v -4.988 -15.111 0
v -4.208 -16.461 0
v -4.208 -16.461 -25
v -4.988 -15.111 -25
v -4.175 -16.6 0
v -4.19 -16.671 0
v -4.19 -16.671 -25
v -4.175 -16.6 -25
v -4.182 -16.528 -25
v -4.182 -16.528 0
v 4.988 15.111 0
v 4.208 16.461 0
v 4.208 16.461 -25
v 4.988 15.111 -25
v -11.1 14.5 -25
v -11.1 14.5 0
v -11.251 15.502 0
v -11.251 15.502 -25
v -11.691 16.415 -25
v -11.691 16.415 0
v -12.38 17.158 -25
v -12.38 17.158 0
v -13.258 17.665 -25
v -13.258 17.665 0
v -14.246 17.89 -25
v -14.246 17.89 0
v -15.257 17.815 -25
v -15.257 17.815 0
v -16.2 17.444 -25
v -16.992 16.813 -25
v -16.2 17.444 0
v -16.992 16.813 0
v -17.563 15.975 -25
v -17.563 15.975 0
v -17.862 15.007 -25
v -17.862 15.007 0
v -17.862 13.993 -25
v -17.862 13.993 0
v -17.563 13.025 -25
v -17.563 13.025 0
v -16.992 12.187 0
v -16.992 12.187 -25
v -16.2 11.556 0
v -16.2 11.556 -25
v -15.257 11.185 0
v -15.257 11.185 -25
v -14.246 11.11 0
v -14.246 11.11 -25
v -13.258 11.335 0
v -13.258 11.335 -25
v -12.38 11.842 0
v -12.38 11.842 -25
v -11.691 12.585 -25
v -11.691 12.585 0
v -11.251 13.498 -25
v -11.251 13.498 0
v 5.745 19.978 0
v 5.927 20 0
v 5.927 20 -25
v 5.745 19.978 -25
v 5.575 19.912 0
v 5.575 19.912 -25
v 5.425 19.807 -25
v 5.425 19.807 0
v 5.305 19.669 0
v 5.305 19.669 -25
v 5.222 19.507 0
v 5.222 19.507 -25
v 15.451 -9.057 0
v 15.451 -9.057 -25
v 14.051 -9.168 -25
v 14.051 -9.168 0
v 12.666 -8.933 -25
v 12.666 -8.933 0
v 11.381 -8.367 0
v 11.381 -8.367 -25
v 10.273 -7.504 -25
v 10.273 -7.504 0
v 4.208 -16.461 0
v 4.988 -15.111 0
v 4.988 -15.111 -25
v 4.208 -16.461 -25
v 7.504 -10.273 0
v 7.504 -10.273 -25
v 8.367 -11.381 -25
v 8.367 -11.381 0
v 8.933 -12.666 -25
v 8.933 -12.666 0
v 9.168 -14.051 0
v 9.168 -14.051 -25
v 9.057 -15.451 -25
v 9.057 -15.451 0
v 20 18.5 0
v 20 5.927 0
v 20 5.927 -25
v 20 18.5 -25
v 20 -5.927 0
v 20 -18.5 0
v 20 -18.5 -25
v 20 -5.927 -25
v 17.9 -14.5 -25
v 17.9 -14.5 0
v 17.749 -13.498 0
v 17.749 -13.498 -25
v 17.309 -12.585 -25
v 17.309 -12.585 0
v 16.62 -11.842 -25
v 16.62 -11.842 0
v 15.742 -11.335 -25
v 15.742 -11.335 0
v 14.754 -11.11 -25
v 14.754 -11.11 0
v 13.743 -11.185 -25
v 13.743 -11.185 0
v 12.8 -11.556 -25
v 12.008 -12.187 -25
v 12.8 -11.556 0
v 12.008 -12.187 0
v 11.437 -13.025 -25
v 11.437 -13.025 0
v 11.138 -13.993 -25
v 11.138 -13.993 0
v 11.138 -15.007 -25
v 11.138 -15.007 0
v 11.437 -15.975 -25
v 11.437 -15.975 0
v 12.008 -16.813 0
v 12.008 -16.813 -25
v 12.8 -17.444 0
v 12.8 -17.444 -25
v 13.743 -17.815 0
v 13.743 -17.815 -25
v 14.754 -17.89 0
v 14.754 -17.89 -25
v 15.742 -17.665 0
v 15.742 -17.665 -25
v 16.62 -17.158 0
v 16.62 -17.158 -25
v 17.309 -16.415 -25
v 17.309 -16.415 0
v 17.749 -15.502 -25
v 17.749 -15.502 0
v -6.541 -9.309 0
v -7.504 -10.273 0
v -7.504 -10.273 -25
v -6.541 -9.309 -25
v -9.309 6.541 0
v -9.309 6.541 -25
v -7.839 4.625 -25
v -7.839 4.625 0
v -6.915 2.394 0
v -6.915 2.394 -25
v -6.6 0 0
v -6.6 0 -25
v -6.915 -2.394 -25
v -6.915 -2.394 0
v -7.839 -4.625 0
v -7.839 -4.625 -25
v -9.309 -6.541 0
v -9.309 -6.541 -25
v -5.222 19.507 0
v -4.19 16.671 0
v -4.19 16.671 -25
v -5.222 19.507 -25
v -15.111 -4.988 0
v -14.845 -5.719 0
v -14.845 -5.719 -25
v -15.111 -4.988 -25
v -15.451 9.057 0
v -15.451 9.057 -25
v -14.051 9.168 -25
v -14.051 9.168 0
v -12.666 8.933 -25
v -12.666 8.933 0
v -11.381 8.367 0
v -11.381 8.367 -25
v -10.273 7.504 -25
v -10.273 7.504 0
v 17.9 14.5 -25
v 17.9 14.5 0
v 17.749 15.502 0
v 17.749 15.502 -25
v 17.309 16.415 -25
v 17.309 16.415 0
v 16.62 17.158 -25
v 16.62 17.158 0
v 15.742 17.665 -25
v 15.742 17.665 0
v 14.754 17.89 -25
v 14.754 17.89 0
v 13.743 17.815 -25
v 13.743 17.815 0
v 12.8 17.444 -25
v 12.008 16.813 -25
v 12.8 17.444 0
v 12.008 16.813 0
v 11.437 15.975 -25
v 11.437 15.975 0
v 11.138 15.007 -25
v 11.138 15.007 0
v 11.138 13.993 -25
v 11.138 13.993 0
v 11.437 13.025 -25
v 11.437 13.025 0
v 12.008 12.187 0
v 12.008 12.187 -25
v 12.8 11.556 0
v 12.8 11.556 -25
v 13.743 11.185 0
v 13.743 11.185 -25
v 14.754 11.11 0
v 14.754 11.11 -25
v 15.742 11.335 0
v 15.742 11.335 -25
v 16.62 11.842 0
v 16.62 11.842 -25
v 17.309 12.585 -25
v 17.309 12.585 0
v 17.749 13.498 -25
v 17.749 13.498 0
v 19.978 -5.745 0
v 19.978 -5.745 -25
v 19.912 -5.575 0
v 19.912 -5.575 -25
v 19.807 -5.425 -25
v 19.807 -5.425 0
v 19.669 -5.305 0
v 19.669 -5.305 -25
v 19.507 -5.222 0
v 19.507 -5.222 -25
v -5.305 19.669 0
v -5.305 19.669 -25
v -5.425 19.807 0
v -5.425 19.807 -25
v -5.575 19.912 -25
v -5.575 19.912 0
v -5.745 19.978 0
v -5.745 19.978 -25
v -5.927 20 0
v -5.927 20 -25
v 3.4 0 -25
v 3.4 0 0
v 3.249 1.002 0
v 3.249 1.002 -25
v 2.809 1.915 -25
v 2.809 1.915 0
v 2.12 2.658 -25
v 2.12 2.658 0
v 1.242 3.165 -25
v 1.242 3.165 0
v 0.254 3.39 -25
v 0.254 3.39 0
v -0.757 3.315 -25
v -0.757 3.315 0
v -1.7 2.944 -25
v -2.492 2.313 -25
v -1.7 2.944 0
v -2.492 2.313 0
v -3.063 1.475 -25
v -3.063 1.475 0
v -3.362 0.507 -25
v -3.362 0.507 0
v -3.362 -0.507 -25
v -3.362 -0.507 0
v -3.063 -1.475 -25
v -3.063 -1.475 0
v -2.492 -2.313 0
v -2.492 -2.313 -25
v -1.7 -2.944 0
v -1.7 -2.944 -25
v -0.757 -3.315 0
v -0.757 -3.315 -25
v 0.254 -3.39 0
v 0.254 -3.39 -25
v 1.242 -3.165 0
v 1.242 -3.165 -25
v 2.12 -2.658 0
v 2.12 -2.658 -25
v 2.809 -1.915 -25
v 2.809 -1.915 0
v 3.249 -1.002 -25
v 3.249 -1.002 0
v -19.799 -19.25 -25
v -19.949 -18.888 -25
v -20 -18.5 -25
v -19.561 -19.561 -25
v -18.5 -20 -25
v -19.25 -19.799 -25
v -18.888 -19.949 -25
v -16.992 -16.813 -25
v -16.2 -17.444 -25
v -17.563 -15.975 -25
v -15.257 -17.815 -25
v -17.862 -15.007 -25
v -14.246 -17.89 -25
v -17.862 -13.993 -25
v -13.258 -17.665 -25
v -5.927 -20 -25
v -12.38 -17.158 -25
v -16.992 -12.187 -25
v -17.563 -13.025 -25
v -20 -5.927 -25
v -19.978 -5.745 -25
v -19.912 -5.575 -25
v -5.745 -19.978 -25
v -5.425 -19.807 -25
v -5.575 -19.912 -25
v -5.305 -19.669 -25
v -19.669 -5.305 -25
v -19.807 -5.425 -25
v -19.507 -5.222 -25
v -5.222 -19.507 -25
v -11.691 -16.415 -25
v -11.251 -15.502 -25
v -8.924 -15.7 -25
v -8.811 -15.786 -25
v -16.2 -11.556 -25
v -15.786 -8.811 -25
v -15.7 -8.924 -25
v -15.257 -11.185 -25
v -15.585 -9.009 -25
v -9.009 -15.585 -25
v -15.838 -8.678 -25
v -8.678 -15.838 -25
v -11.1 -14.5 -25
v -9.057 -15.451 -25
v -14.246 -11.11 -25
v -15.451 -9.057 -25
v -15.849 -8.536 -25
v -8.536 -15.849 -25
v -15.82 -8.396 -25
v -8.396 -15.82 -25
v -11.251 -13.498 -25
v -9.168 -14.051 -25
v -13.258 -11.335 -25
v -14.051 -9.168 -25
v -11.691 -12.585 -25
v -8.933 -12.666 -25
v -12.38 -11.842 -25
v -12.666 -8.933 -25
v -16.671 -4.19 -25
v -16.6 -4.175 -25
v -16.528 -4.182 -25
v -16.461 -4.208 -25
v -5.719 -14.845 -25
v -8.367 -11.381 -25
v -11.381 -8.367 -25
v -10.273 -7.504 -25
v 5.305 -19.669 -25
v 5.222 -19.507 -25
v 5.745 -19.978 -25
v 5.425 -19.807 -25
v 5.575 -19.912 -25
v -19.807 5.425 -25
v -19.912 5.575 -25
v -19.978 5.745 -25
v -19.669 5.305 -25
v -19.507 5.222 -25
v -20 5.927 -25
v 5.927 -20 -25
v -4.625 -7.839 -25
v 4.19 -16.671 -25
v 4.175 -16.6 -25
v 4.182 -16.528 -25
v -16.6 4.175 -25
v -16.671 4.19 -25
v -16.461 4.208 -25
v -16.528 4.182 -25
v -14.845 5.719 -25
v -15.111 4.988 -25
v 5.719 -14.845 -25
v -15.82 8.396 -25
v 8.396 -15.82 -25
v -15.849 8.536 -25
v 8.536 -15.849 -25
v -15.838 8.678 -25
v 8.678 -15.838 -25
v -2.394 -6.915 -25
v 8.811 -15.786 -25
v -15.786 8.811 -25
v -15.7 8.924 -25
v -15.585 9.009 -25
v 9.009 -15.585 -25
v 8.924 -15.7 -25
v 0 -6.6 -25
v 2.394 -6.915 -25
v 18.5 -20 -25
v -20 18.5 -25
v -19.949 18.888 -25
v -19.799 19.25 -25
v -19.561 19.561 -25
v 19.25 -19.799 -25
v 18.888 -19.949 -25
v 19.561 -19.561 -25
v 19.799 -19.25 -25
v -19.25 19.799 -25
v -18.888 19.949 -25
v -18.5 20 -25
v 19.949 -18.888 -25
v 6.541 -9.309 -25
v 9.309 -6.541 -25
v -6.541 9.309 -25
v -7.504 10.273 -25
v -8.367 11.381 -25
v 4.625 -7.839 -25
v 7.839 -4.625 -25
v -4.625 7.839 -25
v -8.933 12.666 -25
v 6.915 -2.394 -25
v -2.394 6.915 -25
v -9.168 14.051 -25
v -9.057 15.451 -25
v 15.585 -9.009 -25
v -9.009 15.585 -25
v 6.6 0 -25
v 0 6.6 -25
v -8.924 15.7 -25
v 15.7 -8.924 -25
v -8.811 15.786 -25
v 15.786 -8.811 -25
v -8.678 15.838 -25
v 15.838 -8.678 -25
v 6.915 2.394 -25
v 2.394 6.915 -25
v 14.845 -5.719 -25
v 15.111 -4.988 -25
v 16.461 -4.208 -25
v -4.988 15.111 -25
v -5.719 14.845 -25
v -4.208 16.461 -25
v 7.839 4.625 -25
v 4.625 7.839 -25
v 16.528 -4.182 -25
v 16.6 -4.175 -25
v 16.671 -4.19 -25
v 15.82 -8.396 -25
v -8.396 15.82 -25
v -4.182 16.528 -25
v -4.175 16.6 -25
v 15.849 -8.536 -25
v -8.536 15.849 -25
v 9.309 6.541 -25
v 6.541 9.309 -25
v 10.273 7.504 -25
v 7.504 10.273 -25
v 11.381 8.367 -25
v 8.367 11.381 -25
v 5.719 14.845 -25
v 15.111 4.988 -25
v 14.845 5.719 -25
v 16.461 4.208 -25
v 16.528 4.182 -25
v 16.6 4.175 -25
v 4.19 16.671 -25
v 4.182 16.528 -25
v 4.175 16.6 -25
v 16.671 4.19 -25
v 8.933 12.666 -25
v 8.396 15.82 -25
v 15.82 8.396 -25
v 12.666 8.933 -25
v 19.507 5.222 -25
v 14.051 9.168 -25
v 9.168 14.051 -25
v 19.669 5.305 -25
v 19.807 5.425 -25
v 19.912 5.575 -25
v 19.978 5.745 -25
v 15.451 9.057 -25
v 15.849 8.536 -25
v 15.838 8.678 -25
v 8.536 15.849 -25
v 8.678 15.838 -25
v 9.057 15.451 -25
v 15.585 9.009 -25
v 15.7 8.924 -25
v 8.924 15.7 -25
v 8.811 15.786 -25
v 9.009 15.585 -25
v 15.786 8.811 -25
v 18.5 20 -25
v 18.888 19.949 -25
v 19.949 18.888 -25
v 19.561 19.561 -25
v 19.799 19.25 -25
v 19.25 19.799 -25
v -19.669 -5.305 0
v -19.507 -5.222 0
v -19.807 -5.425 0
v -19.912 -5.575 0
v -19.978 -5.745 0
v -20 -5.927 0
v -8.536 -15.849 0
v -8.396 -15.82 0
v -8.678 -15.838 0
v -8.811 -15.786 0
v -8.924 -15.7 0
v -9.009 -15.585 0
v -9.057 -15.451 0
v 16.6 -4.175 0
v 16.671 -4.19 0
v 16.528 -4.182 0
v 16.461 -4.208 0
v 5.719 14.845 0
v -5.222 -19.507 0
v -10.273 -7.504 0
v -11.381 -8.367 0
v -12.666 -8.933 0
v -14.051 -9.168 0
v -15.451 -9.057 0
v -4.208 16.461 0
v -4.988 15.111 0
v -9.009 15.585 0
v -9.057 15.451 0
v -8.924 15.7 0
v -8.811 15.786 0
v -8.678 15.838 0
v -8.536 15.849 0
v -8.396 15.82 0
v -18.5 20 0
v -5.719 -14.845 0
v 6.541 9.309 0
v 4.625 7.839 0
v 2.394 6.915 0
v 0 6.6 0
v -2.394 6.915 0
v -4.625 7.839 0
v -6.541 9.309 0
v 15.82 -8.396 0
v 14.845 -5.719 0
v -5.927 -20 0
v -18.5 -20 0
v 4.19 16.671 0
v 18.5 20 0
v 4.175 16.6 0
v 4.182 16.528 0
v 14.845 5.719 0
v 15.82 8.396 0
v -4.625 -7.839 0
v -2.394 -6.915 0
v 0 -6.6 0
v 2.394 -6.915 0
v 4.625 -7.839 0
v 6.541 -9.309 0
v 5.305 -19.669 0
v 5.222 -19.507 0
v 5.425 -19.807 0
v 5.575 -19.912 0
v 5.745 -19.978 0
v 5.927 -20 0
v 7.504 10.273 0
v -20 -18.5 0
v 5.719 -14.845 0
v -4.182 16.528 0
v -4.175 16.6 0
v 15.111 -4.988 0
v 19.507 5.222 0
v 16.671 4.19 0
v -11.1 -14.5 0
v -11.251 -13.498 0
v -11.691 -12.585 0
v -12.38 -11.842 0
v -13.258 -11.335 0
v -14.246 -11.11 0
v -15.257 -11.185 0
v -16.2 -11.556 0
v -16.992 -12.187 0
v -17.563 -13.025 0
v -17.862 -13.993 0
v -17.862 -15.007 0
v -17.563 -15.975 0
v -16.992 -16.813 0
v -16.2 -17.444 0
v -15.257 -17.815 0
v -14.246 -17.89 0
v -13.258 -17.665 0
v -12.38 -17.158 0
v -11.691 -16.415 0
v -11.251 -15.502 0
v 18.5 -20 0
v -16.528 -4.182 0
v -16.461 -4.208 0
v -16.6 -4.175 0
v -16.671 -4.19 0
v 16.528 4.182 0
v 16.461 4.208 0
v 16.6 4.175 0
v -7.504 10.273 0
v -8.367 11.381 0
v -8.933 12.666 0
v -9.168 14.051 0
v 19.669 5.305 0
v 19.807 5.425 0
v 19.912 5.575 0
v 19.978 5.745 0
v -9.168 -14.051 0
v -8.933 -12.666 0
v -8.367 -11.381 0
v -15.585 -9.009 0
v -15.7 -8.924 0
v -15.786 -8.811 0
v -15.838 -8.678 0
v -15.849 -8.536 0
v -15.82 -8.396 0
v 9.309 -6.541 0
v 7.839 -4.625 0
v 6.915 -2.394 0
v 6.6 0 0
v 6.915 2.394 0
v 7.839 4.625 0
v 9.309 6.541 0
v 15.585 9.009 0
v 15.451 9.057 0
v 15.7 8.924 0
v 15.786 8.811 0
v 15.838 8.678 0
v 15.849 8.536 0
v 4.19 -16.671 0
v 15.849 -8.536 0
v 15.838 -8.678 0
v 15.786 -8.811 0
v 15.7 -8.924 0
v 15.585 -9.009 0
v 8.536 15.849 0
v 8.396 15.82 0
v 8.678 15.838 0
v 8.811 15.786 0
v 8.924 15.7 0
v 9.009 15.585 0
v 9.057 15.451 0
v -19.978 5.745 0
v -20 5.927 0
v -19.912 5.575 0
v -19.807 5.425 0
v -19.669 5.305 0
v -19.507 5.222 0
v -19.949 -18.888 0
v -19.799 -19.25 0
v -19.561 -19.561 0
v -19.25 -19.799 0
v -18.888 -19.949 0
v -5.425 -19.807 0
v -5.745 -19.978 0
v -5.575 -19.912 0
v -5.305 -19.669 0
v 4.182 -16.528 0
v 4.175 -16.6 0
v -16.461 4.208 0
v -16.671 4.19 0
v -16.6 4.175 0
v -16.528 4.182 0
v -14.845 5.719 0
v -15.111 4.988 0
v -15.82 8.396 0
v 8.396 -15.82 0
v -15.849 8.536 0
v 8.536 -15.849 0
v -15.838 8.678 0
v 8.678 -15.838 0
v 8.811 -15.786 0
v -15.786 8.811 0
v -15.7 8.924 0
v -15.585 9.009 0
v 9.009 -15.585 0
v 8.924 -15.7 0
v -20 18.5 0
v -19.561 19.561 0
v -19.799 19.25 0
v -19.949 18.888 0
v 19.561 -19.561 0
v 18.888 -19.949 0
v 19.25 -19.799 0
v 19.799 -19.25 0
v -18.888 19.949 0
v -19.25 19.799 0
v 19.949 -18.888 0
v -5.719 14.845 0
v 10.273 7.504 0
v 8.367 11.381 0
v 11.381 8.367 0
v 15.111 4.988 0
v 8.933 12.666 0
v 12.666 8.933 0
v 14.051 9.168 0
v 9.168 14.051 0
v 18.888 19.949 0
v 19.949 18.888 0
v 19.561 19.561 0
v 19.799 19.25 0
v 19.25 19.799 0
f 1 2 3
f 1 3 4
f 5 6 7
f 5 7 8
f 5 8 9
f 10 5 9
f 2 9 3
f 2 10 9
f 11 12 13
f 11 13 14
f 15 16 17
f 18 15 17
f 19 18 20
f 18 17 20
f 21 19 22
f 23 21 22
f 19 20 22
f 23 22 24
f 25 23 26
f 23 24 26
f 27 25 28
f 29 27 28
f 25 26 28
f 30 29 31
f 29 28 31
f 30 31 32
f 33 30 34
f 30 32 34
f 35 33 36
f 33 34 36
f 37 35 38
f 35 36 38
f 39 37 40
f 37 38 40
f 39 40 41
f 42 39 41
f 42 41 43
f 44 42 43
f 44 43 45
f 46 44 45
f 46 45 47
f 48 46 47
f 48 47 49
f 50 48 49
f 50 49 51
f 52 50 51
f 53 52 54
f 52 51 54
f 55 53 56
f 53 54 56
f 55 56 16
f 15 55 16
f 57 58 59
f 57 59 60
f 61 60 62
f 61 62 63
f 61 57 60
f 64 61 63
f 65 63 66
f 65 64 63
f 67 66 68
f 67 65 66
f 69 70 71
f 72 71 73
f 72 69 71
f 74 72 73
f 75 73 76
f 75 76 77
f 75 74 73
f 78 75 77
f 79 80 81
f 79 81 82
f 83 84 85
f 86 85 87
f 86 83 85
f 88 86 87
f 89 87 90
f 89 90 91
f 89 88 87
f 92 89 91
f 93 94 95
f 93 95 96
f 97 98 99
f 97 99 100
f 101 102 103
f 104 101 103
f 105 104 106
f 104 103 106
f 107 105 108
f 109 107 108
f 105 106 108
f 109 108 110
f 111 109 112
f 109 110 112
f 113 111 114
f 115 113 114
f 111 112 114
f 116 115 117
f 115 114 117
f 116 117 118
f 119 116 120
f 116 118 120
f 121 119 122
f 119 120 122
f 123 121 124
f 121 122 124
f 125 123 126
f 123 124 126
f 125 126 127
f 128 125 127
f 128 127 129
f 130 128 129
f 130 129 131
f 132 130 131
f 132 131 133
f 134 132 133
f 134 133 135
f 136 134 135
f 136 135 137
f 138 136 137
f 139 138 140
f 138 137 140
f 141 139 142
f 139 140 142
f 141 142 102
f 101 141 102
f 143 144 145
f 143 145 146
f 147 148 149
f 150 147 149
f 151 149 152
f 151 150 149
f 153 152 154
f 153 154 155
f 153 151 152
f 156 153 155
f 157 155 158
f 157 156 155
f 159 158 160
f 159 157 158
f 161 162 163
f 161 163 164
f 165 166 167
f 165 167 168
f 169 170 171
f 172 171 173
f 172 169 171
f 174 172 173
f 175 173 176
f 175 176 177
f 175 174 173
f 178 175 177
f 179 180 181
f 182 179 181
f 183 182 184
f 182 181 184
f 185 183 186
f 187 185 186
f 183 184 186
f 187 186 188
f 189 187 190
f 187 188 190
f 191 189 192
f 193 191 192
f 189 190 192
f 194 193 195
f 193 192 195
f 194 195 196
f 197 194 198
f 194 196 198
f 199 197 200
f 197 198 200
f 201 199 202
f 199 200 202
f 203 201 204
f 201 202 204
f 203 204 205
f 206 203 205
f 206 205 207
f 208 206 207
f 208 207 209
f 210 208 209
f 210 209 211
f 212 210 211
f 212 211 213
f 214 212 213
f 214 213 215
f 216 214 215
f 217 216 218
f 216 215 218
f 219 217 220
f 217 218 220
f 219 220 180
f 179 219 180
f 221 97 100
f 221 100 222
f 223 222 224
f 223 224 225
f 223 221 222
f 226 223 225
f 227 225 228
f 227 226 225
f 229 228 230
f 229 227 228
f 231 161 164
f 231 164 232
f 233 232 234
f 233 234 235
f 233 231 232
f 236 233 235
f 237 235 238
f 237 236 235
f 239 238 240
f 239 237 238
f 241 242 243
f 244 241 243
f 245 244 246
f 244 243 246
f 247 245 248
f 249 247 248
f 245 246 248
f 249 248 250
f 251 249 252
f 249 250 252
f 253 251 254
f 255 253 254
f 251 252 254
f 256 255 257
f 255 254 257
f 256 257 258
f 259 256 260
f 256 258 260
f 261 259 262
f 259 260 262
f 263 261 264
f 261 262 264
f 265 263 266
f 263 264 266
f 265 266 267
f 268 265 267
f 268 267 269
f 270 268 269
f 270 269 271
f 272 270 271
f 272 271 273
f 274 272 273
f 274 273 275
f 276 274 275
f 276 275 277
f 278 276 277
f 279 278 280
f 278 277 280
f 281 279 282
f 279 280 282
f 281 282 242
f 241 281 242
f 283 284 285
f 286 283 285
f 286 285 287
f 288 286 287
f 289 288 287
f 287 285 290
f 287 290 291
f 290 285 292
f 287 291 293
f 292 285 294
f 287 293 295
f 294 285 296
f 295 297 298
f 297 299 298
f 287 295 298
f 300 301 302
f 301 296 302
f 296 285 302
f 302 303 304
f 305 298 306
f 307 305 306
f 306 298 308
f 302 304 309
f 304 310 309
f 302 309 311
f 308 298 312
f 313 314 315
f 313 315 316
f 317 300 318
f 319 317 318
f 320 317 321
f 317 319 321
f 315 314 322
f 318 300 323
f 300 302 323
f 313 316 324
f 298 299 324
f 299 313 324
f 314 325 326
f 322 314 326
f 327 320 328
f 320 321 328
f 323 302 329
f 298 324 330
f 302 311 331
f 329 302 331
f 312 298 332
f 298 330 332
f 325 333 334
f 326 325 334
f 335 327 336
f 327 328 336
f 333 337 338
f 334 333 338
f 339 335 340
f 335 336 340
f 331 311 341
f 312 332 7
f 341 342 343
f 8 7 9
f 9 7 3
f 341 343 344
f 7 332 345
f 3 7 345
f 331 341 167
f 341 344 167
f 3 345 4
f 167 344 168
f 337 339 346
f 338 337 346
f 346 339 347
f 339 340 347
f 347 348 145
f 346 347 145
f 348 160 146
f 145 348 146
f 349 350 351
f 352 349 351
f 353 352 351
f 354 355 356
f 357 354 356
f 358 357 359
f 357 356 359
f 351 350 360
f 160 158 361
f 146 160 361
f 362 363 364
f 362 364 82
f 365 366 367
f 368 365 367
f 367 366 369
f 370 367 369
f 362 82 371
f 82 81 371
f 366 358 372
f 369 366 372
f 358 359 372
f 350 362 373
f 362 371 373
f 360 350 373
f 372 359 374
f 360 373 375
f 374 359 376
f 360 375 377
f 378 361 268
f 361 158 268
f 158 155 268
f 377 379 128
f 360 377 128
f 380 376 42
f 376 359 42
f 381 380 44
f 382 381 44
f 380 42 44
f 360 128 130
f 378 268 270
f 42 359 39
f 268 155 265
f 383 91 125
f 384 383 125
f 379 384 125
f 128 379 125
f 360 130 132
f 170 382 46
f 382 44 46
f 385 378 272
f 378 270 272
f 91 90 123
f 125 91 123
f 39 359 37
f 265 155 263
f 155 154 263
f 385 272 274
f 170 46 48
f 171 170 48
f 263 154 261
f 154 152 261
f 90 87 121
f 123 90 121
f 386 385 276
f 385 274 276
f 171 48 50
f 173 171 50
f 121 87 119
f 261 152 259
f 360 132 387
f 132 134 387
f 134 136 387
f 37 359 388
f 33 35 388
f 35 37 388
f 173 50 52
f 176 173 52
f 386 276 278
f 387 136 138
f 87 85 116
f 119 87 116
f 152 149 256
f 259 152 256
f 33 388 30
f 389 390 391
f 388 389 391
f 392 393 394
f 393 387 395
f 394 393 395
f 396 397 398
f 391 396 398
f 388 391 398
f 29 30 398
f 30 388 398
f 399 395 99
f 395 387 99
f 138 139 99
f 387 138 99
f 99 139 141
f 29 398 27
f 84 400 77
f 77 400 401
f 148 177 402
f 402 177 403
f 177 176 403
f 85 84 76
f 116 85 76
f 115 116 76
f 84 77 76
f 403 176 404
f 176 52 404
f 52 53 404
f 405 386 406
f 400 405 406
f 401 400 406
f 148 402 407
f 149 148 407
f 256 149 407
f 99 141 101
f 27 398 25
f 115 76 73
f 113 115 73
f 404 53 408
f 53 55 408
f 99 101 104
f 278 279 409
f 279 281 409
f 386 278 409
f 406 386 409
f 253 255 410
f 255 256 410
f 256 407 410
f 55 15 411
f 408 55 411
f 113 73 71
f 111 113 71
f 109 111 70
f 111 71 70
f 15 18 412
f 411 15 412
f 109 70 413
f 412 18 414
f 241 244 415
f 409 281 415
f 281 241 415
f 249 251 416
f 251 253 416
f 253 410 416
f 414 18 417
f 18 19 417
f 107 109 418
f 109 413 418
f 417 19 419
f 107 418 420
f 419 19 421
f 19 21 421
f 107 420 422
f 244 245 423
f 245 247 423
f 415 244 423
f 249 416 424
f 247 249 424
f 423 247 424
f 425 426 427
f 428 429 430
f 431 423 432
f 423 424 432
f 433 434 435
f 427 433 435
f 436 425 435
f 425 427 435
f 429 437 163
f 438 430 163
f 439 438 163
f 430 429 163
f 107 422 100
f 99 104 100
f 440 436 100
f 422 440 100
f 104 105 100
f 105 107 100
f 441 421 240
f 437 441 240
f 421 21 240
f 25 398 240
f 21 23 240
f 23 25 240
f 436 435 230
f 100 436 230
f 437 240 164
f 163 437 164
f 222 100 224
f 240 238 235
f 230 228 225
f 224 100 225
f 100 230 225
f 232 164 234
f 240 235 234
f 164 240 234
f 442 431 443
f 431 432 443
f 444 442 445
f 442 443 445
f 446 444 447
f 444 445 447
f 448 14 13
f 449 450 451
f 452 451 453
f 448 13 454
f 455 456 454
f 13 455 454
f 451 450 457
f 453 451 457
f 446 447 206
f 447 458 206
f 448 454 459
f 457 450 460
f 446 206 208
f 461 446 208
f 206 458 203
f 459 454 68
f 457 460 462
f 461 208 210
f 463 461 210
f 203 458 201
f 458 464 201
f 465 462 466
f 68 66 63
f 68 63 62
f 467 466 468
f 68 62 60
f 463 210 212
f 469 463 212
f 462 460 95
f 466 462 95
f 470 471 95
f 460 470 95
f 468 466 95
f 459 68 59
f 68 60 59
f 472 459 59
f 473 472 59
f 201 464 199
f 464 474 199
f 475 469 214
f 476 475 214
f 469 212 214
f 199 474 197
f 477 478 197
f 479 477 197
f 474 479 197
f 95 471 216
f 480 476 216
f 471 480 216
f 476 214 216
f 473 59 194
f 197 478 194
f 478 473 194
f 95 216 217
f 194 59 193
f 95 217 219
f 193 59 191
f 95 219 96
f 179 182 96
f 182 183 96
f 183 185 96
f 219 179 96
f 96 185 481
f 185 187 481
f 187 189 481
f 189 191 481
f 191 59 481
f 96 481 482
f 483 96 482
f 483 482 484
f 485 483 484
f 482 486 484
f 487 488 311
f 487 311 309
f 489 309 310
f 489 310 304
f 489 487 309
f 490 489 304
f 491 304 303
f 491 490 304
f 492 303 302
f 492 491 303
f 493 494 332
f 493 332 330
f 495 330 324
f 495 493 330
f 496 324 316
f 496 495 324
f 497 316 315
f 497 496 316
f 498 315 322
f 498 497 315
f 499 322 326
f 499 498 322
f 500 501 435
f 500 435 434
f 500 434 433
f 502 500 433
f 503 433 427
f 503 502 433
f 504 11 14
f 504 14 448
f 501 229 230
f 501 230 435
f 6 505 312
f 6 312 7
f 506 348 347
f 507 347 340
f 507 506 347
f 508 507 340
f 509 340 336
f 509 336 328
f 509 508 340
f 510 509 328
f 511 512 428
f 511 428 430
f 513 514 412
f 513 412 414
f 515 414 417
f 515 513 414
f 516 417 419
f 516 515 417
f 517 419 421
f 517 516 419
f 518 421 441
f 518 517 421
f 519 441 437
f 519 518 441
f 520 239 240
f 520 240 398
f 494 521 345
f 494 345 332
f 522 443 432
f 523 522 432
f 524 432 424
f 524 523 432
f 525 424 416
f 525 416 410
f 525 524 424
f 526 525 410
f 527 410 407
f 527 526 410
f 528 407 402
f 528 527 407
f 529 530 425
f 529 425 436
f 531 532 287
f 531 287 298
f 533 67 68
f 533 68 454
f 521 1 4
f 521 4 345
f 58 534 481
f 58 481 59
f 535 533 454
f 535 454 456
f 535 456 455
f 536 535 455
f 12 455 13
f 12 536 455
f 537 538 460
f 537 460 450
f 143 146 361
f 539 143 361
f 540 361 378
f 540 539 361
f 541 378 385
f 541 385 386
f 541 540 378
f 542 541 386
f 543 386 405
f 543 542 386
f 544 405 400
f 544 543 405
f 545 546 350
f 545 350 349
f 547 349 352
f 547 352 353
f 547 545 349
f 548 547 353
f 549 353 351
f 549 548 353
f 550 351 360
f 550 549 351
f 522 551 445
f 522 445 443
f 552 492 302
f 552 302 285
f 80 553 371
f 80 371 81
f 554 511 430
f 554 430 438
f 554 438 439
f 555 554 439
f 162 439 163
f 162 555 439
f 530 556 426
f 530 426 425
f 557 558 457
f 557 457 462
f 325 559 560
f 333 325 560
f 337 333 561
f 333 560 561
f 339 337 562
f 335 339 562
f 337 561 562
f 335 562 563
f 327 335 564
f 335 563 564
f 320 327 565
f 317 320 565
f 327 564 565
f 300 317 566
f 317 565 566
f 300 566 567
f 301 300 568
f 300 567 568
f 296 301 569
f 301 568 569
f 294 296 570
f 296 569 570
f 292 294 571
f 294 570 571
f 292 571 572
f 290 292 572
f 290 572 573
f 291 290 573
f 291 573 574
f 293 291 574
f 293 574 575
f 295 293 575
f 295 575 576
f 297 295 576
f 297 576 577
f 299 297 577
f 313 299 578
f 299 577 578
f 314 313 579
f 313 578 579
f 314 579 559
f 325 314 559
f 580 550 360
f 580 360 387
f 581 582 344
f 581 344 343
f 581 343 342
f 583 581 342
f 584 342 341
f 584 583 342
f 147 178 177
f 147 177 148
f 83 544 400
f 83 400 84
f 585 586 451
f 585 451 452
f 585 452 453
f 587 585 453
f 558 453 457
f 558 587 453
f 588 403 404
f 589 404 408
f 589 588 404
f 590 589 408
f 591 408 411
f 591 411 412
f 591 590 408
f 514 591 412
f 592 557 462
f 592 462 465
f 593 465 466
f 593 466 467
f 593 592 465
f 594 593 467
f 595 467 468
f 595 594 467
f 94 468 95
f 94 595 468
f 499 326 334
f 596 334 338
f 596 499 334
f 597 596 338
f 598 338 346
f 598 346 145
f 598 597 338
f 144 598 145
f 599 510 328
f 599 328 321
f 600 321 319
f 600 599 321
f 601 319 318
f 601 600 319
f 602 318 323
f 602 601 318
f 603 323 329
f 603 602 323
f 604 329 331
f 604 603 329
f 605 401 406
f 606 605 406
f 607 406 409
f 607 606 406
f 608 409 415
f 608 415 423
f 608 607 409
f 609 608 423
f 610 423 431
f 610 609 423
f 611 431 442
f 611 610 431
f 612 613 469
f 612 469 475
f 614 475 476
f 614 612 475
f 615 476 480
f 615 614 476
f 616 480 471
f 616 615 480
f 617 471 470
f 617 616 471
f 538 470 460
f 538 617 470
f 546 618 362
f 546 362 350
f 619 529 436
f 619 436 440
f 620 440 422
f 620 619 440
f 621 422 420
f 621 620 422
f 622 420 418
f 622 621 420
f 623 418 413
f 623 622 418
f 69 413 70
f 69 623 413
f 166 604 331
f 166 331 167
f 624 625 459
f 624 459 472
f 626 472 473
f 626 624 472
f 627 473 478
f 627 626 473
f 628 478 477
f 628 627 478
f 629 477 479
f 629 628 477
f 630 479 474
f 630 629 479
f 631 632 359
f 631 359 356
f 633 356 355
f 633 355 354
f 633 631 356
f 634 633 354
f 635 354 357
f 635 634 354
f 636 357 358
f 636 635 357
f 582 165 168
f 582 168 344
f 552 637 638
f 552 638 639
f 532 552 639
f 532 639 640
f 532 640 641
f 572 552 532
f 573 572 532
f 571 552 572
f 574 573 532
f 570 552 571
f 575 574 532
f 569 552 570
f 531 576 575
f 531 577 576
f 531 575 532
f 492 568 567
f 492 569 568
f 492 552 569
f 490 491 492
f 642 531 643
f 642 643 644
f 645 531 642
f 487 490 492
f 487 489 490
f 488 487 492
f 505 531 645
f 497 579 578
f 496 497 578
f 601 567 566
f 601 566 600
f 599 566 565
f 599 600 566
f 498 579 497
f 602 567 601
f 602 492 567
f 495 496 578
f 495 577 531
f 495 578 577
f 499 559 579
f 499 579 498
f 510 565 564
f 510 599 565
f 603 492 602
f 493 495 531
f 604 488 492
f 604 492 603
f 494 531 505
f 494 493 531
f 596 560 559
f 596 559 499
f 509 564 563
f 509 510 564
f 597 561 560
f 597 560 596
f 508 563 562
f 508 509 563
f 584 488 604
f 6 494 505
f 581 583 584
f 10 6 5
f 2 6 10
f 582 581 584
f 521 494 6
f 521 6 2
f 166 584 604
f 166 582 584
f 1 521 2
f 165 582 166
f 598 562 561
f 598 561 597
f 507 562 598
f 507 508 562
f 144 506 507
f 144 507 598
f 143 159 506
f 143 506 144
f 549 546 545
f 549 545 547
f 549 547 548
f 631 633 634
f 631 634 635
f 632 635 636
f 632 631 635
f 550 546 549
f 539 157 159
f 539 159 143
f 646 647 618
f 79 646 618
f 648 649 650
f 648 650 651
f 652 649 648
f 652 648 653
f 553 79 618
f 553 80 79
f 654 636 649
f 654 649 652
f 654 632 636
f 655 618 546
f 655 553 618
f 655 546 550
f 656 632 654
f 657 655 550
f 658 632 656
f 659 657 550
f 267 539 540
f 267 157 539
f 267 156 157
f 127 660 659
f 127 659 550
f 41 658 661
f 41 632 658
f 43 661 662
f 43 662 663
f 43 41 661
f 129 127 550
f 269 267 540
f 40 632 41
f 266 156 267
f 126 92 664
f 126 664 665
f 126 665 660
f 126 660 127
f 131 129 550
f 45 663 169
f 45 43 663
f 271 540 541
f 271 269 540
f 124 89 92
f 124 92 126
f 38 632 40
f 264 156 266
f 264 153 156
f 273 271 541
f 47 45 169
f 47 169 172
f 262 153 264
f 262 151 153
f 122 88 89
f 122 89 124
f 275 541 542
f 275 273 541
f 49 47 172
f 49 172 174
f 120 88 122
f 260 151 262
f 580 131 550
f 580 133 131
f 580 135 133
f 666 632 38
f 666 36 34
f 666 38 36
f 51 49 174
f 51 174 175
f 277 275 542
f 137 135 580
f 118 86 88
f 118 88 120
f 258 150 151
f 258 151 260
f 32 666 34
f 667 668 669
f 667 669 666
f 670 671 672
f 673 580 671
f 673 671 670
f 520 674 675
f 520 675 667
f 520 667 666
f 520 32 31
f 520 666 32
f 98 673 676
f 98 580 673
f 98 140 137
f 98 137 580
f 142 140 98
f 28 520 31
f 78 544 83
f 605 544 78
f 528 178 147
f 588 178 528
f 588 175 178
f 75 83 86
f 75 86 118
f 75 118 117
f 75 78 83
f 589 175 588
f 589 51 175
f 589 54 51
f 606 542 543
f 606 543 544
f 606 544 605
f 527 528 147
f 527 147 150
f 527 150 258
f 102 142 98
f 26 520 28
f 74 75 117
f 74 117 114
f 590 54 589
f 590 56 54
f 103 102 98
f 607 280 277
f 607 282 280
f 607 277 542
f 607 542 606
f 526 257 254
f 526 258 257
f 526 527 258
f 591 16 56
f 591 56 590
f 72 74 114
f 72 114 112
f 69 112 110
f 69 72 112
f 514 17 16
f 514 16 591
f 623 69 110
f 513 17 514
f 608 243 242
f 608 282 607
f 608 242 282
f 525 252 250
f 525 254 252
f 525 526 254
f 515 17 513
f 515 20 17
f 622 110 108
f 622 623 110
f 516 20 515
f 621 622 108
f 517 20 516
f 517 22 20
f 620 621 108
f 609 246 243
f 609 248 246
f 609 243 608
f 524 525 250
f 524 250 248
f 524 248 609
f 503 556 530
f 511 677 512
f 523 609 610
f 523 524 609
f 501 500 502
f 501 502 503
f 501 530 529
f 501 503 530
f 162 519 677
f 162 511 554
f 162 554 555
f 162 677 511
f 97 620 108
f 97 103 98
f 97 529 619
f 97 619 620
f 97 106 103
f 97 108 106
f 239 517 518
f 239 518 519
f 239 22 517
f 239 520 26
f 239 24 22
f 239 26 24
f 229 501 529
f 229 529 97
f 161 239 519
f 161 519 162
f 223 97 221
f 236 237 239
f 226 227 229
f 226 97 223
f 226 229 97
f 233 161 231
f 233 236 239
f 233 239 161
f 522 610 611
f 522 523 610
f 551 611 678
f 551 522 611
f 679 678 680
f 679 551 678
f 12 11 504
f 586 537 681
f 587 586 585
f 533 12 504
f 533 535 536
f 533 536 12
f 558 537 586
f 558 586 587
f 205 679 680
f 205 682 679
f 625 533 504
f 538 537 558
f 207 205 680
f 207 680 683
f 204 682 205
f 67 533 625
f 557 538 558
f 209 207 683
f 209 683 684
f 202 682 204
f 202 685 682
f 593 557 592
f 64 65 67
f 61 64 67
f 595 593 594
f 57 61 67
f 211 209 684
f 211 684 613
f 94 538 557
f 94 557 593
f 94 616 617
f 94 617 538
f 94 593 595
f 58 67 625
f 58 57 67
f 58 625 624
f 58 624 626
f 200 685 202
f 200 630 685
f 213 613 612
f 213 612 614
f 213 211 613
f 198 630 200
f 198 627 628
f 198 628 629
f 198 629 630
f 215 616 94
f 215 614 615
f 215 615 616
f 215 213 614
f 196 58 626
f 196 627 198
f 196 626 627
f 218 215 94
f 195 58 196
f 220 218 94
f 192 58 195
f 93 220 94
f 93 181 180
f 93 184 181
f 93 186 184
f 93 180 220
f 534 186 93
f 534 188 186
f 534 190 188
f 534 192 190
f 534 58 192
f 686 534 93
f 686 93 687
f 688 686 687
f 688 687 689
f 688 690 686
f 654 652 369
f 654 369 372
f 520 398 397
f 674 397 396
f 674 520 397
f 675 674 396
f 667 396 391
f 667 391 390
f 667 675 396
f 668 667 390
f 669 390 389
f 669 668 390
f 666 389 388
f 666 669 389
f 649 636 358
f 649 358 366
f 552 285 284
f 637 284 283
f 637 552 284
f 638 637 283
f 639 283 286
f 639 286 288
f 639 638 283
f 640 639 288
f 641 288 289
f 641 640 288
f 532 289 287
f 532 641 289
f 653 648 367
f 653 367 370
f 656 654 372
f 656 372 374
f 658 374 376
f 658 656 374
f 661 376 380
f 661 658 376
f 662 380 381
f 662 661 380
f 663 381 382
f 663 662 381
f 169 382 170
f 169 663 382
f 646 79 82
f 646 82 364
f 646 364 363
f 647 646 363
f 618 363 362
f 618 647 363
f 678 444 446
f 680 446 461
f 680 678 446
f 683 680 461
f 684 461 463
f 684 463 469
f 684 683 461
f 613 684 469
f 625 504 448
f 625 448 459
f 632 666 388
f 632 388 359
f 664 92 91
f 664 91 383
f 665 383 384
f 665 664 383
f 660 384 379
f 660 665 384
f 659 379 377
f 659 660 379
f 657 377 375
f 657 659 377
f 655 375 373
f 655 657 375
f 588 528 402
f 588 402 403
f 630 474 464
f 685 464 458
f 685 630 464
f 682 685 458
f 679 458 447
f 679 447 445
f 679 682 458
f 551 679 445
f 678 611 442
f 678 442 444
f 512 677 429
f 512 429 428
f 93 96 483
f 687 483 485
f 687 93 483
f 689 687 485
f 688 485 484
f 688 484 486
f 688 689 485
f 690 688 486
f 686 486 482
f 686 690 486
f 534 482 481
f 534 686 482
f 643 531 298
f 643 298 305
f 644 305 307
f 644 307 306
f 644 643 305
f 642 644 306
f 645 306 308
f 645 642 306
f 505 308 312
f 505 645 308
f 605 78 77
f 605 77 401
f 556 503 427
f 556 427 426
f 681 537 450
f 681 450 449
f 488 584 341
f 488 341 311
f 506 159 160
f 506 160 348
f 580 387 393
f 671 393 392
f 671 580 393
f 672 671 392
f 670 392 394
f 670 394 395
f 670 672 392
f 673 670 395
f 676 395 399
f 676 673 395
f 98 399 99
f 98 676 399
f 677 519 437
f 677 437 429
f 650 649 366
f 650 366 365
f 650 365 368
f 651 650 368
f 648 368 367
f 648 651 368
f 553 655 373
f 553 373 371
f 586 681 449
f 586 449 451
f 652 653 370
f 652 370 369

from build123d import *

# Parameters (mm, degrees)
SK_MAIN_EXTRUSION_R  = 3.4
MAIN_EXTRUSION_DEPTH = 25


with BuildPart() as part:
    # Sk Main Extrusion → Main Extrusion (new body)
    with BuildSketch(Plane.XY):
        with BuildLine():
            Line((4.190076845, -16.671180212), (5.222054351, -19.506515107))
            ThreePointArc((5.222054351, -19.506515107), (5.496641489, -19.864364033), (5.926823816, -20))
            Line((5.926823816, -20), (18.5, -20))
            ThreePointArc((18.5, -20), (19.560660172, -19.560660172), (20, -18.5))
            Line((20, -18.5), (20, -5.926823816))
            ThreePointArc((20, -5.926823816), (19.864364033, -5.496641489), (19.506515107, -5.222054351))
            Line((19.506515107, -5.222054351), (16.671180212, -4.190076845))
            ThreePointArc((16.671180212, -4.190076845), (16.563886241, -4.175951325), (16.460675177, -4.208493649))
            Line((16.460675177, -4.208493649), (15.111296024, -4.987558066))
            Line((15.111296024, -4.987558066), (14.845251581, -5.718509166))
            Line((14.845251581, -5.718509166), (15.81984631, -8.396186179))
            ThreePointArc((15.81984631, -8.396186179), (15.786489799, -8.811074612), (15.450654467, -9.056960151))
            ThreePointArc((15.450654467, -9.056960151), (12.665882372, -8.933433013), (10.272684887, -7.504160339))
            Line((10.272684887, -7.504160339), (9.309262274, -6.540737726))
            ThreePointArc((9.309262274, -6.540737726), (6.6, 0), (9.309262274, 6.540737726))
            Line((9.309262274, 6.540737726), (10.272684887, 7.504160339))
            ThreePointArc((10.272684887, 7.504160339), (12.665882372, 8.933433013), (15.450654467, 9.056960151))
            ThreePointArc((15.450654467, 9.056960151), (15.786489799, 8.811074612), (15.81984631, 8.396186179))
            Line((15.81984631, 8.396186179), (14.845251581, 5.718509166))
            Line((14.845251581, 5.718509166), (15.111296024, 4.987558066))
            Line((15.111296024, 4.987558066), (16.460675177, 4.208493649))
            ThreePointArc((16.460675177, 4.208493649), (16.563886241, 4.175951325), (16.671180212, 4.190076845))
            Line((16.671180212, 4.190076845), (19.506515107, 5.222054351))
            ThreePointArc((19.506515107, 5.222054351), (19.864364033, 5.496641489), (20, 5.926823816))
            Line((20, 5.926823816), (20, 18.5))
            ThreePointArc((20, 18.5), (19.560660172, 19.560660172), (18.5, 20))
            Line((18.5, 20), (5.926823816, 20))
            ThreePointArc((5.926823816, 20), (5.496641489, 19.864364033), (5.222054351, 19.506515107))
            Line((5.222054351, 19.506515107), (4.190076845, 16.671180212))
            ThreePointArc((4.190076845, 16.671180212), (4.175951325, 16.563886241), (4.208493649, 16.460675177))
            Line((4.208493649, 16.460675177), (4.987558066, 15.111296024))
            Line((4.987558066, 15.111296024), (5.718509166, 14.845251581))
            Line((5.718509166, 14.845251581), (8.396186179, 15.81984631))
            ThreePointArc((8.396186179, 15.81984631), (8.811074612, 15.786489799), (9.056960151, 15.450654467))
            ThreePointArc((9.056960151, 15.450654467), (8.933433013, 12.665882372), (7.504160339, 10.272684887))
            Line((7.504160339, 10.272684887), (6.540737726, 9.309262274))
            ThreePointArc((6.540737726, 9.309262274), (0, 6.6), (-6.540737726, 9.309262274))
            Line((-6.540737726, 9.309262274), (-7.504160339, 10.272684887))
            ThreePointArc((-7.504160339, 10.272684887), (-8.933433013, 12.665882372), (-9.056960151, 15.450654467))
            ThreePointArc((-9.056960151, 15.450654467), (-8.811074612, 15.786489799), (-8.396186179, 15.81984631))
            Line((-8.396186179, 15.81984631), (-5.718509166, 14.845251581))
            Line((-5.718509166, 14.845251581), (-4.987558066, 15.111296024))
            Line((-4.987558066, 15.111296024), (-4.208493649, 16.460675177))
            ThreePointArc((-4.208493649, 16.460675177), (-4.175951325, 16.563886241), (-4.190076845, 16.671180212))
            Line((-4.190076845, 16.671180212), (-5.222054351, 19.506515107))
            ThreePointArc((-5.222054351, 19.506515107), (-5.496641489, 19.864364033), (-5.926823816, 20))
            Line((-5.926823816, 20), (-18.5, 20))
            ThreePointArc((-18.5, 20), (-19.560660172, 19.560660172), (-20, 18.5))
            Line((-20, 18.5), (-20, 5.926823816))
            ThreePointArc((-20, 5.926823816), (-19.864364033, 5.496641489), (-19.506515107, 5.222054351))
            Line((-19.506515107, 5.222054351), (-16.671180212, 4.190076845))
            ThreePointArc((-16.671180212, 4.190076845), (-16.563886241, 4.175951325), (-16.460675177, 4.208493649))
            Line((-16.460675177, 4.208493649), (-15.111296024, 4.987558066))
            Line((-15.111296024, 4.987558066), (-14.845251581, 5.718509166))
            Line((-14.845251581, 5.718509166), (-15.81984631, 8.396186179))
            ThreePointArc((-15.81984631, 8.396186179), (-15.786489799, 8.811074612), (-15.450654467, 9.056960151))
            ThreePointArc((-15.450654467, 9.056960151), (-12.665882372, 8.933433013), (-10.272684887, 7.504160339))
            Line((-10.272684887, 7.504160339), (-9.309262274, 6.540737726))
            ThreePointArc((-9.309262274, 6.540737726), (-6.6, 0), (-9.309262274, -6.540737726))
            Line((-9.309262274, -6.540737726), (-10.272684887, -7.504160339))
            ThreePointArc((-10.272684887, -7.504160339), (-12.665882372, -8.933433013), (-15.450654467, -9.056960151))
            ThreePointArc((-15.450654467, -9.056960151), (-15.786489799, -8.811074612), (-15.81984631, -8.396186179))
            Line((-15.81984631, -8.396186179), (-14.845251581, -5.718509166))
            Line((-14.845251581, -5.718509166), (-15.111296024, -4.987558066))
            Line((-15.111296024, -4.987558066), (-16.460675177, -4.208493649))
            ThreePointArc((-16.460675177, -4.208493649), (-16.563886241, -4.175951325), (-16.671180212, -4.190076845))
            Line((-16.671180212, -4.190076845), (-19.506515107, -5.222054351))
            ThreePointArc((-19.506515107, -5.222054351), (-19.864364033, -5.496641489), (-20, -5.926823816))
            Line((-20, -5.926823816), (-20, -18.5))
            ThreePointArc((-20, -18.5), (-19.560660172, -19.560660172), (-18.5, -20))
            Line((-18.5, -20), (-5.926823816, -20))
            ThreePointArc((-5.926823816, -20), (-5.496641489, -19.864364033), (-5.222054351, -19.506515107))
            Line((-5.222054351, -19.506515107), (-4.190076845, -16.671180212))
            ThreePointArc((-4.190076845, -16.671180212), (-4.175951325, -16.563886241), (-4.208493649, -16.460675177))
            Line((-4.208493649, -16.460675177), (-4.987558066, -15.111296024))
            Line((-4.987558066, -15.111296024), (-5.718509166, -14.845251581))
            Line((-5.718509166, -14.845251581), (-8.396186179, -15.81984631))
            ThreePointArc((-8.396186179, -15.81984631), (-8.811074612, -15.786489799), (-9.056960151, -15.450654467))
            ThreePointArc((-9.056960151, -15.450654467), (-8.933433013, -12.665882372), (-7.504160339, -10.272684887))
            Line((-7.504160339, -10.272684887), (-6.540737726, -9.309262274))
            ThreePointArc((-6.540737726, -9.309262274), (0, -6.6), (6.540737726, -9.309262274))
            Line((6.540737726, -9.309262274), (7.504160339, -10.272684887))
            ThreePointArc((7.504160339, -10.272684887), (8.933433013, -12.665882372), (9.056960151, -15.450654467))
            ThreePointArc((9.056960151, -15.450654467), (8.811074612, -15.786489799), (8.396186179, -15.81984631))
            Line((8.396186179, -15.81984631), (5.718509166, -14.845251581))
            Line((5.718509166, -14.845251581), (4.987558066, -15.111296024))
            Line((4.987558066, -15.111296024), (4.208493649, -16.460675177))
            ThreePointArc((4.208493649, -16.460675177), (4.175951325, -16.563886241), (4.190076845, -16.671180212))
        make_face()
        with Locations((-14.5, -14.5)):
            Circle(SK_MAIN_EXTRUSION_R, mode=Mode.SUBTRACT)
        with Locations((14.5, -14.5)):
            Circle(SK_MAIN_EXTRUSION_R, mode=Mode.SUBTRACT)
        with Locations((14.5, 14.5)):
            Circle(SK_MAIN_EXTRUSION_R, mode=Mode.SUBTRACT)
        with Locations((-14.5, 14.5)):
            Circle(SK_MAIN_EXTRUSION_R, mode=Mode.SUBTRACT)
        Circle(SK_MAIN_EXTRUSION_R, mode=Mode.SUBTRACT)
    extrude(amount=-MAIN_EXTRUSION_DEPTH)


solid = part.part
